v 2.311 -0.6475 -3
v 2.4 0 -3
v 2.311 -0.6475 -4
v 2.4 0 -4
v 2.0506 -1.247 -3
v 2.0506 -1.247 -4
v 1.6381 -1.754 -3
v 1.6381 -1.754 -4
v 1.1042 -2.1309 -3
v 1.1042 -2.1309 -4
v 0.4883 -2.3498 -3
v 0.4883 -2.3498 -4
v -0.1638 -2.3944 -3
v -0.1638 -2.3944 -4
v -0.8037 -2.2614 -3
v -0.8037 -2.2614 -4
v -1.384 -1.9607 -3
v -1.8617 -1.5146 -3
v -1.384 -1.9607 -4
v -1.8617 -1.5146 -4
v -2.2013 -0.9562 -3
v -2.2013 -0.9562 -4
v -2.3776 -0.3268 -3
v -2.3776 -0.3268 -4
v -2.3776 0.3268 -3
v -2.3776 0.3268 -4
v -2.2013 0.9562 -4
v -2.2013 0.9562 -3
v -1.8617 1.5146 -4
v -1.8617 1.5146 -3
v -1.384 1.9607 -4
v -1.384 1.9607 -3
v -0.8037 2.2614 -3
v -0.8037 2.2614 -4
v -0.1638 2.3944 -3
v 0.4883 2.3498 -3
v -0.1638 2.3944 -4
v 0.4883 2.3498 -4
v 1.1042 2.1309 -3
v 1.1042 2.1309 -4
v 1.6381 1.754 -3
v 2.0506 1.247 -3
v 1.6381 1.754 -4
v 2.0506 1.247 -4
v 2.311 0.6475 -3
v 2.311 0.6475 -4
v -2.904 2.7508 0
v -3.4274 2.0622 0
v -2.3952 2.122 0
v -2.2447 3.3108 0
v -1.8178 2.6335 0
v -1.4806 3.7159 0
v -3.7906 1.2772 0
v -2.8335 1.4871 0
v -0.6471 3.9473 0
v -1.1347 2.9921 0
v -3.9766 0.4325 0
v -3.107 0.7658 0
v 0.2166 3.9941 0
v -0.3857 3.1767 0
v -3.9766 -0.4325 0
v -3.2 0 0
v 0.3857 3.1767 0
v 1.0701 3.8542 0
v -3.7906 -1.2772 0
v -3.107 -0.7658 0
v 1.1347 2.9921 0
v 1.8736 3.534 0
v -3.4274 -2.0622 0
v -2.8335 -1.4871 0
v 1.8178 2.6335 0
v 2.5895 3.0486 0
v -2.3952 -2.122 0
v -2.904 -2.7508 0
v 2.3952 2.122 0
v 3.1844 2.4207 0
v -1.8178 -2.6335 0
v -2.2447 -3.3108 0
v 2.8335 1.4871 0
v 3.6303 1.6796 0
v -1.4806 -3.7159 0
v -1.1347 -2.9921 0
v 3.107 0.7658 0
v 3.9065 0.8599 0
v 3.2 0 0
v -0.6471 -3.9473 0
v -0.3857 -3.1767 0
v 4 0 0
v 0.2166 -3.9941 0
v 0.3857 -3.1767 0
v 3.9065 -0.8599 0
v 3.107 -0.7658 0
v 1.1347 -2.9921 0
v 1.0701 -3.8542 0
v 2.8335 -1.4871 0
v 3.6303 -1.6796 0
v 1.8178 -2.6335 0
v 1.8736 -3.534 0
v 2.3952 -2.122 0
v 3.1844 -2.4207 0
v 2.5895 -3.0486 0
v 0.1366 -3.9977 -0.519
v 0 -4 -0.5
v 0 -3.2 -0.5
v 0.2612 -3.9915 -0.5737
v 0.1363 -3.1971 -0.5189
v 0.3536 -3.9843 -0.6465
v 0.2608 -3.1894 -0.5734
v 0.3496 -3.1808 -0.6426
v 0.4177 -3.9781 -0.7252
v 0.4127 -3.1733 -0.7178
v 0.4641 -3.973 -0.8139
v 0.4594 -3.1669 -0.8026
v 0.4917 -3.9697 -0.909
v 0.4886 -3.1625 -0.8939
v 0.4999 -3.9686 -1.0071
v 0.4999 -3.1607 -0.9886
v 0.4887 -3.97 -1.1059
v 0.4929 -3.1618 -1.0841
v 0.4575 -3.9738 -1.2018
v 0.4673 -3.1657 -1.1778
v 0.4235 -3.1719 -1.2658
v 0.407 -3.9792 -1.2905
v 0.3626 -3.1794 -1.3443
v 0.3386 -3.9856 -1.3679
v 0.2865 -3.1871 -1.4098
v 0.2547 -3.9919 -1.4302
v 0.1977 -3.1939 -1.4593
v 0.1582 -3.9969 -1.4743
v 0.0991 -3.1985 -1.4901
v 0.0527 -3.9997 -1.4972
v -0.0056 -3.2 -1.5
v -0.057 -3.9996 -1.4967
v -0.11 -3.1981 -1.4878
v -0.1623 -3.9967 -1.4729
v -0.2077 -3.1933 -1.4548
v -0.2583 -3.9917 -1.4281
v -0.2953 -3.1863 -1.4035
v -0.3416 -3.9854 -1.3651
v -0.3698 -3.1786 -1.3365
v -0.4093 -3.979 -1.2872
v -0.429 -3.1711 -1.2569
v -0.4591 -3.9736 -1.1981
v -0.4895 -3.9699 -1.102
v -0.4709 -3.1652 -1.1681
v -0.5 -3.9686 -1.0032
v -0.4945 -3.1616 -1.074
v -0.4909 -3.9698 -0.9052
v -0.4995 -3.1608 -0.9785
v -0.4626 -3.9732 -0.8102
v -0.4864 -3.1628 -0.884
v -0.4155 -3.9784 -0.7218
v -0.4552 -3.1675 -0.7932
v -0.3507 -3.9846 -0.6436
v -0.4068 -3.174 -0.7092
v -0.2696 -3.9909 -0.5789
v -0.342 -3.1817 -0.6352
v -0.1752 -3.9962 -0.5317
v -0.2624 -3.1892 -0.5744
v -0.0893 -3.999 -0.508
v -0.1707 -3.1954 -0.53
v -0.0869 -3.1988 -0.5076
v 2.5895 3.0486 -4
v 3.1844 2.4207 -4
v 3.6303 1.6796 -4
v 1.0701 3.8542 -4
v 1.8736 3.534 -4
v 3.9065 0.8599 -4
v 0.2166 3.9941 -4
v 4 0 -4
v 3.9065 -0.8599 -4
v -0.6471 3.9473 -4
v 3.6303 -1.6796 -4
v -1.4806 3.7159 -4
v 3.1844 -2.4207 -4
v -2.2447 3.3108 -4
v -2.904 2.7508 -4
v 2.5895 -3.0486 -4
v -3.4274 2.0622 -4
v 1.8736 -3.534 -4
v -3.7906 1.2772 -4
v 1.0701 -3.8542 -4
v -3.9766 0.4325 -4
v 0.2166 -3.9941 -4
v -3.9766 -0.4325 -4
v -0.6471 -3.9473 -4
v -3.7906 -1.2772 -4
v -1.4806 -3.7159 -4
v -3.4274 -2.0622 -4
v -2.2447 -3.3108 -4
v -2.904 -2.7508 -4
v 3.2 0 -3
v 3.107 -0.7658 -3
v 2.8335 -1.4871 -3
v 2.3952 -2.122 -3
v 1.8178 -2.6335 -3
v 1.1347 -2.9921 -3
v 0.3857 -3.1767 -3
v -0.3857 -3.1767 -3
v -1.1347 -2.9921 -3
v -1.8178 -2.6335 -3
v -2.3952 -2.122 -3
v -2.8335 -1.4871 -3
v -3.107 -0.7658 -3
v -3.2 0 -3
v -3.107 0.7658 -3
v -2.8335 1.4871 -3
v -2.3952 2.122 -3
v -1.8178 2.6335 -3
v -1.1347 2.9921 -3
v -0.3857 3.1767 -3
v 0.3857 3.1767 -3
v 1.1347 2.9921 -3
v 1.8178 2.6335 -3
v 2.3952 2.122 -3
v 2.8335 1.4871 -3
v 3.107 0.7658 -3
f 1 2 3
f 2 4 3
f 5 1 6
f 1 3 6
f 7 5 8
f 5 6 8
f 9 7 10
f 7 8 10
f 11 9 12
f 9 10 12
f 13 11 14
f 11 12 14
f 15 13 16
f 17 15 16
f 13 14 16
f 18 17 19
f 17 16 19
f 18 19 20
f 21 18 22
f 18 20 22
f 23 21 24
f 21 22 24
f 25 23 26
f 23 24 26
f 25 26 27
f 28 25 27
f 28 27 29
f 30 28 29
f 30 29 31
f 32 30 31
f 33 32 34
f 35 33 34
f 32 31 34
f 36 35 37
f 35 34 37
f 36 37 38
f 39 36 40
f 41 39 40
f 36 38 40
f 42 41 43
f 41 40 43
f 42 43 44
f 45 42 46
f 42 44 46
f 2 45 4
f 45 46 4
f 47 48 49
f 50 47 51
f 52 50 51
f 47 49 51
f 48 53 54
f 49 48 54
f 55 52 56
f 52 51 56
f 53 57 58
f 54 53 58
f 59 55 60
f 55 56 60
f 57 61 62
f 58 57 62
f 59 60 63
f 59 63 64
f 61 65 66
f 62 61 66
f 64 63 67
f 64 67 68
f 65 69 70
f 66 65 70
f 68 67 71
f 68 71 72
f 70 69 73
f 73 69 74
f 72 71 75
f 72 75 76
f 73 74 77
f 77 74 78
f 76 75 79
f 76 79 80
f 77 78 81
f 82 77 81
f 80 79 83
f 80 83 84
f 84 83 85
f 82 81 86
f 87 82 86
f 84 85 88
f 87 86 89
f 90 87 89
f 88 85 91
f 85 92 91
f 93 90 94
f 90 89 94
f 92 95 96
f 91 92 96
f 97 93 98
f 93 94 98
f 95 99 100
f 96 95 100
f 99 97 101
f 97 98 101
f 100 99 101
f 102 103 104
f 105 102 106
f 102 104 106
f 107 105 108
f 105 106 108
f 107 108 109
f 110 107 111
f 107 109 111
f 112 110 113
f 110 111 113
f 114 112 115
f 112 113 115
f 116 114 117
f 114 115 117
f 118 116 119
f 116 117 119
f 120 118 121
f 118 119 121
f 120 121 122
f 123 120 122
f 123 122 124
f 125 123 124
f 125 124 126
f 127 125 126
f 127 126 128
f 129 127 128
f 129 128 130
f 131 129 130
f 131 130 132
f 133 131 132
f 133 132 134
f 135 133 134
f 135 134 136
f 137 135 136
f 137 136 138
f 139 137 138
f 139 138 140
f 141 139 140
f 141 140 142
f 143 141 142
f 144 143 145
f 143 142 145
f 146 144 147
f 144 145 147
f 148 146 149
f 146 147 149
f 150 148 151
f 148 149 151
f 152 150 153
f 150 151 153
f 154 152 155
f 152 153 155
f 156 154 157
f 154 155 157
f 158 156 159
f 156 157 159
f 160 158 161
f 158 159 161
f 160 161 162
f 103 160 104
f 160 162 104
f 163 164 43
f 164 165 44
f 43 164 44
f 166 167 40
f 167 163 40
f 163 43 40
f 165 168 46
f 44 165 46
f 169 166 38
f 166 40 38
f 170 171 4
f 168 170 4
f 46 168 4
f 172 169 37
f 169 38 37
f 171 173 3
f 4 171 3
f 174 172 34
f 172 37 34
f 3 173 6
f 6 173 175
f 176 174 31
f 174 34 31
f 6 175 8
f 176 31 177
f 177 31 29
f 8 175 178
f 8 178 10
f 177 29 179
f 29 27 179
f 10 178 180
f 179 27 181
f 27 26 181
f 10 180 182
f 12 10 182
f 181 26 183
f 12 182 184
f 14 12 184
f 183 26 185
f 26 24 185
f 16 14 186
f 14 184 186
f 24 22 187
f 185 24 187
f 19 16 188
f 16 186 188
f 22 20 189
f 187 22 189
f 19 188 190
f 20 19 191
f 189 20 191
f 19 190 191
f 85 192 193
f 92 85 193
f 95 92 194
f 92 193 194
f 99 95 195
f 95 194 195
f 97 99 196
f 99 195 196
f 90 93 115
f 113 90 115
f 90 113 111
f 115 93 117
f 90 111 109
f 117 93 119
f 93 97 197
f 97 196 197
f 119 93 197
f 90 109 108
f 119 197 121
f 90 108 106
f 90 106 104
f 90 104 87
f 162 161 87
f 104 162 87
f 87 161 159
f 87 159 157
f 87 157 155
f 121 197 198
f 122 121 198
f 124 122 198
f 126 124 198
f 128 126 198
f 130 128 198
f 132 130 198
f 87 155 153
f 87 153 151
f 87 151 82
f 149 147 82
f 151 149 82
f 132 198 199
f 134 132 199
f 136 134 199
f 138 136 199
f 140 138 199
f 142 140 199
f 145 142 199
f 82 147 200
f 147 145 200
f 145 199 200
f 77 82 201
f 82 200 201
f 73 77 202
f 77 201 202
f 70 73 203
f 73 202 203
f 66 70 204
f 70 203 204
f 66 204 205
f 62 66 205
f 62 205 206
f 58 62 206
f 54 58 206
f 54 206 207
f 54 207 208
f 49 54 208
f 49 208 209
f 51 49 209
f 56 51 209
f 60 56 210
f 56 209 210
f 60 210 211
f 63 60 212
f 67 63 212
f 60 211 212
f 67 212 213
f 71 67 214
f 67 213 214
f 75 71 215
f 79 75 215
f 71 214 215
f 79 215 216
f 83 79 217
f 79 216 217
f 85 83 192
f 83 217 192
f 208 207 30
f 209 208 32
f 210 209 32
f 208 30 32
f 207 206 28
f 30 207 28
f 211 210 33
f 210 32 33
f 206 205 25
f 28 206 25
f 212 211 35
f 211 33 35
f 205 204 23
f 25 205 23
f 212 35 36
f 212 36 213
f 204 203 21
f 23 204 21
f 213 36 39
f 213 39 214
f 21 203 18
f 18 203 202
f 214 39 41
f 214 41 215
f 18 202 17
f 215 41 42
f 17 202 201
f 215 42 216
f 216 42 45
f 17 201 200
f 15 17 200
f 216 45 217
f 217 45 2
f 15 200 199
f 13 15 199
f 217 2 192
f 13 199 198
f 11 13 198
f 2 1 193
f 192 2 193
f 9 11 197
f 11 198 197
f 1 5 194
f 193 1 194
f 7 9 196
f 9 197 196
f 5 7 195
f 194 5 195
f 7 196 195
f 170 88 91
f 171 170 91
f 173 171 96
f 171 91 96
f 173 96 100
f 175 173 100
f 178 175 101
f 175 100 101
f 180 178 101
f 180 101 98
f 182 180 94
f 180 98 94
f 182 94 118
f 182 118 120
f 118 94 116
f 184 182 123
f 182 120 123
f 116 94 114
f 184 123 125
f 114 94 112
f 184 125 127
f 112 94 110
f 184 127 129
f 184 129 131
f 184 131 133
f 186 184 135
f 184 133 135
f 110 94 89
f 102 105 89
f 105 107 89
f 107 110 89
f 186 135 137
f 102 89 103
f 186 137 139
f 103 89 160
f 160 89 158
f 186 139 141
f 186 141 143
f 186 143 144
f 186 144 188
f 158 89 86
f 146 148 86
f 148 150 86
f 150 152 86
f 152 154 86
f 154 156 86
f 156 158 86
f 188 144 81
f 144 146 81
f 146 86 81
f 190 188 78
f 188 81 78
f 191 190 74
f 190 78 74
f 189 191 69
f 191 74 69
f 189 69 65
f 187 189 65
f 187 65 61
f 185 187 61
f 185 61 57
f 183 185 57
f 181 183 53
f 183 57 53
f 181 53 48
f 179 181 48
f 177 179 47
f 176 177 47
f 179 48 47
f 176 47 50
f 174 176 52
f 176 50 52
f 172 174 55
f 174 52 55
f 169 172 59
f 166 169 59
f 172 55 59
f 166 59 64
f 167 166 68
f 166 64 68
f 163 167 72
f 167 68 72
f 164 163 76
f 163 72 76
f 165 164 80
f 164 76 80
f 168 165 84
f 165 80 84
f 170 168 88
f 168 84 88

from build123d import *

# Parameters (mm, degrees)
SKETCH_3_R          = 0.5
CUT_EXTRUDE_1_DEPTH = 10


with BuildPart() as part:
    # 草图2 → 旋转1 (revolve)
    with BuildSketch(Plane(origin=(0, 0, 0), x_dir=(0, 0, -1), z_dir=(1, 0, 0)), mode=Mode.PRIVATE) as revolve_1_sk:
        Polygon((0, 3.2), (3, 3.2), (3, 2.4), (4, 2.4), (4, 4), (0, 4), align=None)
    revolve(revolve_1_sk.sketch.rotate(Axis((0, 0, 0), (0, 0, -1)), 90), axis=Axis((0, 0, 0), (0, 0, -1)))

    # 草图3 → 切除-拉伸1 (cut)
    with BuildSketch(Plane(origin=(0, 0, 0), x_dir=(1, 0, 0), z_dir=(0, 1, 0))):
        with Locations(Location((0, 1, 0), (0, 0, 270))):
            Circle(SKETCH_3_R)
    extrude(amount=-CUT_EXTRUDE_1_DEPTH, mode=Mode.SUBTRACT)


solid = part.part
